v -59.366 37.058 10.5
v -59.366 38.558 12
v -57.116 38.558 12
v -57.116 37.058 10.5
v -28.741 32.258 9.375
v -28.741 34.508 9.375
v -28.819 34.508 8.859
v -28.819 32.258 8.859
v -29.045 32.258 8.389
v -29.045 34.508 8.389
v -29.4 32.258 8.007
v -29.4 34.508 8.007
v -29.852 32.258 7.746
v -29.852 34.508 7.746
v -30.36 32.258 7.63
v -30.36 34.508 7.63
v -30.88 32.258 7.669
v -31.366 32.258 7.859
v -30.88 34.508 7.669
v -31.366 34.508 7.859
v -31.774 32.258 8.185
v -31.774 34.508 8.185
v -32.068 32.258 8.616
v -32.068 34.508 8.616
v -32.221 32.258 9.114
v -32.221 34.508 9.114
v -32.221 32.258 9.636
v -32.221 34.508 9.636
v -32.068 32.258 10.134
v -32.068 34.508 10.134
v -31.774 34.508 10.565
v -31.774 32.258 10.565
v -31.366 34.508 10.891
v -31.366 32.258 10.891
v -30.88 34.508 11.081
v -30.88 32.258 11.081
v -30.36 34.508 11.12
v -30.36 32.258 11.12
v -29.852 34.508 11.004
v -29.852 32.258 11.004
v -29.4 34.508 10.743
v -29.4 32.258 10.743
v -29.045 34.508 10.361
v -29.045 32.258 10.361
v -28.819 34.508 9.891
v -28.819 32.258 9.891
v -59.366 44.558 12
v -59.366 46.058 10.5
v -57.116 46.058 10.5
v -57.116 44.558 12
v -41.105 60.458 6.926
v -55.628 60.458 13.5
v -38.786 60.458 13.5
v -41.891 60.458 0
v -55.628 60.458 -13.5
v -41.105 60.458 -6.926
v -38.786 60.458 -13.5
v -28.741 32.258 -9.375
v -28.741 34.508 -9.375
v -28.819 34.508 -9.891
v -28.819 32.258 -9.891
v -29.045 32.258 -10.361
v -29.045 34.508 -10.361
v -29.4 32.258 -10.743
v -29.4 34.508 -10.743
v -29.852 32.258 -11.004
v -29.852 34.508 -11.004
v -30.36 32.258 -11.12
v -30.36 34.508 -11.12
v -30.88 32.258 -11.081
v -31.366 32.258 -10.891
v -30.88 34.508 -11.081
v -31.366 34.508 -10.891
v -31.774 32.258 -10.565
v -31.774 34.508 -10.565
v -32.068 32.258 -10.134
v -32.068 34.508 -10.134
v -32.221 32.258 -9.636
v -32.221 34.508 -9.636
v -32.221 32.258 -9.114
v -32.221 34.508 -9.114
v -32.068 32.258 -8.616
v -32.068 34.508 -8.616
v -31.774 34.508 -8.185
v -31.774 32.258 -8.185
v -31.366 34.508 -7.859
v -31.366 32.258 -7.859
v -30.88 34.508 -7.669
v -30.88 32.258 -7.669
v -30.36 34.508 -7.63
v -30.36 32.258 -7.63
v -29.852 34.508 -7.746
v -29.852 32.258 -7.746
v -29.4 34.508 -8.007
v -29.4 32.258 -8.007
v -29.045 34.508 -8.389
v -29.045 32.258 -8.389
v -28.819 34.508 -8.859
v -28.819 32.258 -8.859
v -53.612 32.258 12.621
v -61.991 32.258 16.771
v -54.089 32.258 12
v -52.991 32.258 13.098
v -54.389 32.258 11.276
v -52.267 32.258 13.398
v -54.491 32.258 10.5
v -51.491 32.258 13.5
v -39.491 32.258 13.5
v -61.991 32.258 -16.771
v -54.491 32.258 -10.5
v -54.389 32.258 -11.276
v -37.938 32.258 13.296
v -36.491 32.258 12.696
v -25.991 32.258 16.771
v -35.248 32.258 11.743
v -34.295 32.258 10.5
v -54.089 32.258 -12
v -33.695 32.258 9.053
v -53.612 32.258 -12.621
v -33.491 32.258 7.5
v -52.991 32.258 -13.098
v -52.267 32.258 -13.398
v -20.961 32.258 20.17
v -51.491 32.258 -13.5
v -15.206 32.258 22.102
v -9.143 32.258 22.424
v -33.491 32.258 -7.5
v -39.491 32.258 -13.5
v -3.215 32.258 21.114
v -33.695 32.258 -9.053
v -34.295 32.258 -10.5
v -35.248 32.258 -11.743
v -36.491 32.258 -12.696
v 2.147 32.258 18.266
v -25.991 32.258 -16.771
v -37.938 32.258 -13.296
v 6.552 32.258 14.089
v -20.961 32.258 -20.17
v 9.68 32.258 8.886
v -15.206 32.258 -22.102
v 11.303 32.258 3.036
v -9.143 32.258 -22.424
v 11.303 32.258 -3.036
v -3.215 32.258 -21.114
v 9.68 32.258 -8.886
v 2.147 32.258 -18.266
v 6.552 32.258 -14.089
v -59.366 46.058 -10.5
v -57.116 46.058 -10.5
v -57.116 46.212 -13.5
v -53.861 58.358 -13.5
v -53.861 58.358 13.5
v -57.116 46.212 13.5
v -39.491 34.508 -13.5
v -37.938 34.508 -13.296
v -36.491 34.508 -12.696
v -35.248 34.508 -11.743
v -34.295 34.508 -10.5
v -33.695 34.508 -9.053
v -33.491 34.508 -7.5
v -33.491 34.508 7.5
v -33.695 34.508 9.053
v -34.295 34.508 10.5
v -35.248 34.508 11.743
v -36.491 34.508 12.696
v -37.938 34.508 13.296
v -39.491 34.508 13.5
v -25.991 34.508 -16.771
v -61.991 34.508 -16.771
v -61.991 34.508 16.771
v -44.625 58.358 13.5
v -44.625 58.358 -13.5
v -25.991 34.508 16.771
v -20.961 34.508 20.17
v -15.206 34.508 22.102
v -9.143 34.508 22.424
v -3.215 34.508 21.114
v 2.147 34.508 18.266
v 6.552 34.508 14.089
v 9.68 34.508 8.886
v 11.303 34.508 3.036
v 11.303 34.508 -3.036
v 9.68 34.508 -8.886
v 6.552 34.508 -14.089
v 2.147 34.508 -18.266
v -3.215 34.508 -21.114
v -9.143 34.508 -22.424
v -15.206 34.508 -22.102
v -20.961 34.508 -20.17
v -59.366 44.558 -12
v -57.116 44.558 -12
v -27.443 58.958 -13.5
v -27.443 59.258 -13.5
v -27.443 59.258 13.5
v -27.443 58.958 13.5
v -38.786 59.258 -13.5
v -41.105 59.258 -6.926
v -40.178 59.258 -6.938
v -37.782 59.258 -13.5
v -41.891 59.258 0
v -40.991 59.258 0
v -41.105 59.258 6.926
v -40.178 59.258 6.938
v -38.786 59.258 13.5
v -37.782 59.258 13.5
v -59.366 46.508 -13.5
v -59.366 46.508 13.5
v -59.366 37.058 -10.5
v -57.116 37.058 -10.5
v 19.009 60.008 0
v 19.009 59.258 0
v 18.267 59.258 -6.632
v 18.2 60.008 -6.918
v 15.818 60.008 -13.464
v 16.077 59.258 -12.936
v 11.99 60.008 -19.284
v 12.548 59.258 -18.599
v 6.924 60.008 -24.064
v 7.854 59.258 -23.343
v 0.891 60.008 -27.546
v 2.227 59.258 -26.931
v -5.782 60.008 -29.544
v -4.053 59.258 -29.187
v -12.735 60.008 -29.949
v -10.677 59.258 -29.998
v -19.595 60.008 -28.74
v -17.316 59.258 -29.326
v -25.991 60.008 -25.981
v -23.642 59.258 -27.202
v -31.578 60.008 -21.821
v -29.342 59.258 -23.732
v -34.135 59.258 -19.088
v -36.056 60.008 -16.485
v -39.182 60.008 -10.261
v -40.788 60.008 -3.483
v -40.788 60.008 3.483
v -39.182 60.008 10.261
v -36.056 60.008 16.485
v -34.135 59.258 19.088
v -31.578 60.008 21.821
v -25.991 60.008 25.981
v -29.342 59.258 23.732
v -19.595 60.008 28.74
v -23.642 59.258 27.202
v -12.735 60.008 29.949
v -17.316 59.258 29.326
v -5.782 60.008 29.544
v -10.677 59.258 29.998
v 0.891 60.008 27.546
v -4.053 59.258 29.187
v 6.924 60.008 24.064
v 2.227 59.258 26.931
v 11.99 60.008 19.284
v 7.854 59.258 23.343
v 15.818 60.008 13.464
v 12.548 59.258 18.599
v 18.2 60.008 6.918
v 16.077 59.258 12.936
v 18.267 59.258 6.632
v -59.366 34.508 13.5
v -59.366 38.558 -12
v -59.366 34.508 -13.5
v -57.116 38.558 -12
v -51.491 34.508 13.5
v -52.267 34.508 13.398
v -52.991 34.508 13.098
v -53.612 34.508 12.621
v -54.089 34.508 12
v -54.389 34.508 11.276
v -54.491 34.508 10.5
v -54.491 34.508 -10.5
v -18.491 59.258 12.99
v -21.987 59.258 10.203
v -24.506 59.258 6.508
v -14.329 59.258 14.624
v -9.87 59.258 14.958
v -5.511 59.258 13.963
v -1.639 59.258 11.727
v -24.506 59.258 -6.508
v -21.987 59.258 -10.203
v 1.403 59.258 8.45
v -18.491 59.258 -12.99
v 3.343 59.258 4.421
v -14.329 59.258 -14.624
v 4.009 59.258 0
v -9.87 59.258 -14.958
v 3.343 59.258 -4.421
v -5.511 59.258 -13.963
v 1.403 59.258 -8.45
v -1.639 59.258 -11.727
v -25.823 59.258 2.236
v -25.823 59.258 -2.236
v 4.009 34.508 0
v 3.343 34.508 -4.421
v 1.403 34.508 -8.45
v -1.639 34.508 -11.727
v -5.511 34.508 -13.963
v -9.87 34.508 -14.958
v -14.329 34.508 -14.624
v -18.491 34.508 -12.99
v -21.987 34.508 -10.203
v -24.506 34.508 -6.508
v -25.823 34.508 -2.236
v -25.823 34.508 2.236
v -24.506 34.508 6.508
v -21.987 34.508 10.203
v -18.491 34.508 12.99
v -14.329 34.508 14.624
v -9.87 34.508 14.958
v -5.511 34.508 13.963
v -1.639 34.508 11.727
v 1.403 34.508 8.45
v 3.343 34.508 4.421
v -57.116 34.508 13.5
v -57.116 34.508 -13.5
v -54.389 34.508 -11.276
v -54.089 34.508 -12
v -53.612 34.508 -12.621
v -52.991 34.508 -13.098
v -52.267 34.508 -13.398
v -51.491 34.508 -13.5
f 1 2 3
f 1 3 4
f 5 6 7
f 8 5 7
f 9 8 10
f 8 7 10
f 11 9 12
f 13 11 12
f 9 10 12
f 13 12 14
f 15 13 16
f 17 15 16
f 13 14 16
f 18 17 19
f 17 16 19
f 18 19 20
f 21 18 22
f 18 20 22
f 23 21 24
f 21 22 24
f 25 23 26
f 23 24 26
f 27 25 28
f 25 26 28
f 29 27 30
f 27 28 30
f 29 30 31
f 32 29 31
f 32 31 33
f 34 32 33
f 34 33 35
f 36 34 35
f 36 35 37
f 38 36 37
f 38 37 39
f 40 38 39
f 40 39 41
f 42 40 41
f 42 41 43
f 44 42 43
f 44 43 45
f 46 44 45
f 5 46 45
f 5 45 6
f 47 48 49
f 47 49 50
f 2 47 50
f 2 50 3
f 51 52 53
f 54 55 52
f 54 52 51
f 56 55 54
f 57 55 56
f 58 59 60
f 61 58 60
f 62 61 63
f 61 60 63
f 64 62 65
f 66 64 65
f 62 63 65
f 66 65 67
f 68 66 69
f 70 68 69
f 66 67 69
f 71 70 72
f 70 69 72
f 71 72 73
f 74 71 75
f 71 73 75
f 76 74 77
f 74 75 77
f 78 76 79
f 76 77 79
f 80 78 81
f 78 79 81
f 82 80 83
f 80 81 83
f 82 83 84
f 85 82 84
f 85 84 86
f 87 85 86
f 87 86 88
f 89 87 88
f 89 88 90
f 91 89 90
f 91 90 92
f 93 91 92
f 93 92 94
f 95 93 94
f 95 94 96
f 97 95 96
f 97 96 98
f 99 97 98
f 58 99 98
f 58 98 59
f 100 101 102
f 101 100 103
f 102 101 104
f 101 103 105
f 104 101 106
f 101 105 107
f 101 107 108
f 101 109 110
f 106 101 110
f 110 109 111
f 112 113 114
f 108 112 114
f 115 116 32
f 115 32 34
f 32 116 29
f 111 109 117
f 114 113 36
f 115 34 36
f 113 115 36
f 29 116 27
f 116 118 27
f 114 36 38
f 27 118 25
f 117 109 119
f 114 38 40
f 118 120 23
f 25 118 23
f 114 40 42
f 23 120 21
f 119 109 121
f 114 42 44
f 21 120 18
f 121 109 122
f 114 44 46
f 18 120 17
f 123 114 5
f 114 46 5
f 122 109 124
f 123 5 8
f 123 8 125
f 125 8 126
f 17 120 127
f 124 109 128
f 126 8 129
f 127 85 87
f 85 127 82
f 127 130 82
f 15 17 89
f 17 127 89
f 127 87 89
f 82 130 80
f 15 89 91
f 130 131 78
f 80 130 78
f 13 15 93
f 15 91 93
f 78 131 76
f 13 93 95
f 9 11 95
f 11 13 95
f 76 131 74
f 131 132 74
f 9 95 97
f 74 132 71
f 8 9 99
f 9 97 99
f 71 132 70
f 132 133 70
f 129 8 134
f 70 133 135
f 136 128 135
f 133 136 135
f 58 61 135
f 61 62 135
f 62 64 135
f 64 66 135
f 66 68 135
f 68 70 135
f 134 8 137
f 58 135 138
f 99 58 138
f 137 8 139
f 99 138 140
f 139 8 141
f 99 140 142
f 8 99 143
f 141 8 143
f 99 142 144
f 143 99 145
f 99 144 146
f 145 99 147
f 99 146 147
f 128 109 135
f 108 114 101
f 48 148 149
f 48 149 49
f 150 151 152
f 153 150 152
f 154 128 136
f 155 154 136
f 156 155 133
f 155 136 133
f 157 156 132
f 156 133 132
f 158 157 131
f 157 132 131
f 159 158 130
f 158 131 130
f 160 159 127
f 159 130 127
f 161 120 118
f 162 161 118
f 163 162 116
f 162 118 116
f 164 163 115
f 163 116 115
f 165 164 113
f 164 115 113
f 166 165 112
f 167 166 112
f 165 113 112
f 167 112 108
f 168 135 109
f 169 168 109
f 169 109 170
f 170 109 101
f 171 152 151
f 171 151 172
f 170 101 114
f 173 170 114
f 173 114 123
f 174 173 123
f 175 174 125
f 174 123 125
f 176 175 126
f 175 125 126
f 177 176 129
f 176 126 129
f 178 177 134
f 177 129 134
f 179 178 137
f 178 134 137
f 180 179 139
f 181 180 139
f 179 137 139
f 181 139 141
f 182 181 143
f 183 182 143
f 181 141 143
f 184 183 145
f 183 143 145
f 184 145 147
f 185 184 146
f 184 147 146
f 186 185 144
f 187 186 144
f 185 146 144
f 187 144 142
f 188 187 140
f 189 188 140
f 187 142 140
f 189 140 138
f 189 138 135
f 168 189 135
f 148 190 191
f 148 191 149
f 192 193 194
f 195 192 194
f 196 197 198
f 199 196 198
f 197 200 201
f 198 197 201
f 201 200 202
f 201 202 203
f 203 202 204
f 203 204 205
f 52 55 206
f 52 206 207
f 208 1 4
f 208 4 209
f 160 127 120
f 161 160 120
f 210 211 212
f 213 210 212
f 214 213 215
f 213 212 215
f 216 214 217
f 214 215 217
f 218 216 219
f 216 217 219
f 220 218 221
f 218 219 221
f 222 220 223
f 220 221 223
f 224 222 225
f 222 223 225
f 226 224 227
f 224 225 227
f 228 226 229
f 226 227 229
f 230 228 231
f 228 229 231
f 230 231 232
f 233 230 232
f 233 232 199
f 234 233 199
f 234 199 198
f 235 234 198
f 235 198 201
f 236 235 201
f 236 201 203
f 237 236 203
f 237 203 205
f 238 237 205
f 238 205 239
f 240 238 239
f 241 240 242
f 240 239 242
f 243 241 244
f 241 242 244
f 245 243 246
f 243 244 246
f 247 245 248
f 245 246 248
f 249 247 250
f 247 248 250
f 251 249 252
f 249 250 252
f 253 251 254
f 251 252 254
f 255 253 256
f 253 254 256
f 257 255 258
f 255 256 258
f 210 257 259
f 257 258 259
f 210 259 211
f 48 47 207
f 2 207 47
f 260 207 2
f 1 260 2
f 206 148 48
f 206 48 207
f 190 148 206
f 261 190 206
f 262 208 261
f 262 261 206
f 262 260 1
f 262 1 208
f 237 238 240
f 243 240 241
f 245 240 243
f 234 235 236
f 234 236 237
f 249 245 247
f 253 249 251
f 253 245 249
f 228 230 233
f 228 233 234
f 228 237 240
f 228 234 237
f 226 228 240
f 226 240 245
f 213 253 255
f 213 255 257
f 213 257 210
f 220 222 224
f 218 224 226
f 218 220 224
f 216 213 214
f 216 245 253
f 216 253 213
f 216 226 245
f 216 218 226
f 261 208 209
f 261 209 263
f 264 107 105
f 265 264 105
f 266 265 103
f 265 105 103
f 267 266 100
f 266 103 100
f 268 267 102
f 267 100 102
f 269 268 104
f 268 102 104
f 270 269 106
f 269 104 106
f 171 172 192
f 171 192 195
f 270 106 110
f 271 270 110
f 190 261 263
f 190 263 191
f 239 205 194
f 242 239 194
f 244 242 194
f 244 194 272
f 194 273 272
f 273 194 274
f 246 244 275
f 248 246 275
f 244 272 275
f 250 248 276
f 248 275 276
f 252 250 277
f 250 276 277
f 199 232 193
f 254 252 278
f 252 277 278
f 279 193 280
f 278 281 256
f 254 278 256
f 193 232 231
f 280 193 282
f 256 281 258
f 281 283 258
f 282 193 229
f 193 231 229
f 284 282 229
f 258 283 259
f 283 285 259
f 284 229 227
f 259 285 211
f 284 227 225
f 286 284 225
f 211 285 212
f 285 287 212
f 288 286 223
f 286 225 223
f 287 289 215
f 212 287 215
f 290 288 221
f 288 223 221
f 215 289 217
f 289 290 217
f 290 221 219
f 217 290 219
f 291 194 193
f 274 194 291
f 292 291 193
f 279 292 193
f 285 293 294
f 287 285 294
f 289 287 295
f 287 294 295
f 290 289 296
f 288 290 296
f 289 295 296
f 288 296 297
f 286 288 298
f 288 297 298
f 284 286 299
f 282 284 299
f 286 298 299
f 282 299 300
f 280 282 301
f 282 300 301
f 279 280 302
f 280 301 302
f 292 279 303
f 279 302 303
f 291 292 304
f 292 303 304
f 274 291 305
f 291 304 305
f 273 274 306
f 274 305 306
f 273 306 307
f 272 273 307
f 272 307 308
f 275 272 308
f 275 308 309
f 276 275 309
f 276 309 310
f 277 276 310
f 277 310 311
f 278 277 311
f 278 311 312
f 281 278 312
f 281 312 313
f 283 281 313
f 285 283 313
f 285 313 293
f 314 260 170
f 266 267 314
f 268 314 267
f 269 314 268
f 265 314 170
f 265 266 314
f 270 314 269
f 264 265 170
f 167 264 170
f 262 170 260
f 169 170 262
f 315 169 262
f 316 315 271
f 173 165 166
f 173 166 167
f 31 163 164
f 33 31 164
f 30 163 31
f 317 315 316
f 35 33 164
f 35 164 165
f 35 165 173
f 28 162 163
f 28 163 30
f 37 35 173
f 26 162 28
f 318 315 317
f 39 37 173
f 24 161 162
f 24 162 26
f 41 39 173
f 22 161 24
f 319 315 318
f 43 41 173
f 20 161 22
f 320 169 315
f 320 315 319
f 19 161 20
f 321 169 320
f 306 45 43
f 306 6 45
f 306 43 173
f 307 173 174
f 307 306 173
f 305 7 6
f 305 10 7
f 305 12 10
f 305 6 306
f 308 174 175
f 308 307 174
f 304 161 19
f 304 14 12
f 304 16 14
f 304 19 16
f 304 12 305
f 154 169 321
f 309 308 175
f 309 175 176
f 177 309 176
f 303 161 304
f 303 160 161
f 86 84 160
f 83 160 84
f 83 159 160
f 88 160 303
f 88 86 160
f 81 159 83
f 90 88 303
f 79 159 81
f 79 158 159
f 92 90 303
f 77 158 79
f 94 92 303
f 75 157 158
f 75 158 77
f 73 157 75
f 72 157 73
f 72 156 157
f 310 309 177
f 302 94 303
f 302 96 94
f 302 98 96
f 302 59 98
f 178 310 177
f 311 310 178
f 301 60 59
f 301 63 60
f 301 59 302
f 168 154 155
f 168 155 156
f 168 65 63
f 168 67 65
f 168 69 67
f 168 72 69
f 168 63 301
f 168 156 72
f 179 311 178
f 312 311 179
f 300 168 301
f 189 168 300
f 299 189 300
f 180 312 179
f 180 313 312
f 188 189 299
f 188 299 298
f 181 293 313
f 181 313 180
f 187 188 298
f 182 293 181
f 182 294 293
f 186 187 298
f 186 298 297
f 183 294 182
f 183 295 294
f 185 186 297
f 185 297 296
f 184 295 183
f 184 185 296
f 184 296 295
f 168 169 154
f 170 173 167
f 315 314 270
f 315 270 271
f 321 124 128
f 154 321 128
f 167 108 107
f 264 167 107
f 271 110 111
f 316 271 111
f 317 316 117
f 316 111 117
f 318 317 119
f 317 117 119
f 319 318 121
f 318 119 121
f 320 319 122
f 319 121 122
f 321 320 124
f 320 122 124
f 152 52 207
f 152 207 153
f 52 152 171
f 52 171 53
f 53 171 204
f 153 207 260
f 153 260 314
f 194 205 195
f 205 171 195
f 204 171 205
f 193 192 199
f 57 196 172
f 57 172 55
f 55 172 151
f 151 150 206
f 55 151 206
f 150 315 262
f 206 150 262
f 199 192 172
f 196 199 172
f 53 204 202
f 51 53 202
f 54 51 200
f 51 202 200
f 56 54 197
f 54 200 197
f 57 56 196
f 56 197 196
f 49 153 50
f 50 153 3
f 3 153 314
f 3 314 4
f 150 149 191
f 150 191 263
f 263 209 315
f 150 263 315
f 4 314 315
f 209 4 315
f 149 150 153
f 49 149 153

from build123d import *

# Parameters (mm, degrees)
SKETCH1_R               = 50
BOSS_EXTRUDE1_DEPTH     = 7.5
SKETCH1_2_R             = 50
BOSS_EXTRUDE2_DEPTH     = 90
SKETCH2_W               = 7.5
SKETCH2_H               = 90
BOSS_EXTRUDE3_DEPTH     = 40
SKETCH4_R               = 100
BOSS_EXTRUDE4_DEPTH     = 2.5
SKETCH7_W               = 90
SKETCH7_H               = 50
BOSS_EXTRUDE9_DEPTH     = 7.5
CUT_EXTRUDE1_REACH      = 297.683
SKETCH14_W              = 95
SKETCH14_H              = 90
BOSS_EXTRUDE13_DEPTH    = 3
BOSS_EXTRUDE14_DEPTH    = 5
CUT_EXTRUDE3_DEPTH      = 5
CUT_EXTRUDE3_DEPTH_BACK = 1
SKETCH17_W              = 70.898930346
SKETCH17_H              = 90
CHAMFER3_SIZE           = 2
CHAMFER3_SIZE2          = 57.272506566
SCALE1_SCALE            = 0.3
CUT_EXTRUDE4_REACH      = 75.595
SKETCH19_R              = 1.75


with BuildPart() as part:
    # Sketch1 → Boss-Extrude1 (new body)
    with BuildSketch(Plane(origin=(0, 0, 0), x_dir=(1, 0, 0), z_dir=(0, 1, 0))):
        with BuildLine():
            Line((-50, 55.901699437), (-170, 55.901699437))
            Line((-170, 55.901699437), (-170, -55.901699437))
            Line((-170, -55.901699437), (-50, -55.901699437))
            ThreePointArc((-50, -55.901699437), (75, 0), (-50, 55.901699437))
        make_face()
        Circle(SKETCH1_R, mode=Mode.SUBTRACT)
        with BuildLine():
            Line((-95, -45), (-135, -45))
            ThreePointArc((-135, -45), (-142.071067812, -42.071067812), (-145, -35))
            Line((-145, -35), (-145, 35))
            ThreePointArc((-145, 35), (-142.071067812, 42.071067812), (-135, 45))
            Line((-135, 45), (-95, 45))
            ThreePointArc((-95, 45), (-80.857864376, 39.142135624), (-75, 25))
            Line((-75, 25), (-75, -25))
            ThreePointArc((-75, -25), (-80.857864376, -39.142135624), (-95, -45))
        make_face(mode=Mode.SUBTRACT)
    extrude(amount=BOSS_EXTRUDE1_DEPTH)

    # Sketch1<2> → Boss-Extrude2 (add)
    with BuildSketch(Plane(origin=(0, 0, 0), x_dir=(1, 0, 0), z_dir=(0, 1, 0))):
        Circle(SKETCH1_2_R)
    extrude(amount=BOSS_EXTRUDE2_DEPTH)

    # Sketch2 → Boss-Extrude3 (add)
    with BuildSketch(Plane(origin=(0, 7.5, 0), x_dir=(1, 0, 0), z_dir=(0, 1, 0))):
        with Locations((-157.5, 0)):
            Rectangle(SKETCH2_W, SKETCH2_H)
    extrude(amount=BOSS_EXTRUDE3_DEPTH)

    # Sketch4 → Boss-Extrude4 (add)
    with BuildSketch(Plane(origin=(0, 90, 0), x_dir=(1, 0, 0), z_dir=(0, 1, 0))):
        Circle(SKETCH4_R)
    extrude(amount=BOSS_EXTRUDE4_DEPTH)

    # Sketch7 → Boss-Extrude9 (add)
    with BuildSketch(Plane(origin=(-162.32329818, 43.49439666, 0), x_dir=(0, 0, 1), z_dir=(-0.9659258262890691, 0.2588190451025179, 0))):
        with Locations((0, 29.146905726)):
            Rectangle(SKETCH7_W, SKETCH7_H)
    extrude(amount=-BOSS_EXTRUDE9_DEPTH)

    # Sketch3 → Cut-Extrude1 (cut, up to next)
    with BuildSketch(Plane.ZY.offset(161.25), mode=Mode.PRIVATE) as cut_extrude1_sk1:
        Polygon((35, 46), (40, 41), (40, 21), (35, 16), (-35, 16), (-40, 21), (-40, 41), (-35, 46), align=None)
    cut_extrude1_tool1 = extrude(cut_extrude1_sk1.sketch, amount=-CUT_EXTRUDE1_REACH, mode=Mode.PRIVATE) & part.part
    add(cut_extrude1_tool1.solids().sort_by_distance((-161.25, 31, 0))[0], mode=Mode.SUBTRACT)

    # Sketch14 → Boss-Extrude13 (add)
    with BuildSketch(Plane.XZ.offset(-90)):
        with Locations((-102.34127557, 0)):
            Rectangle(SKETCH14_W, SKETCH14_H)
    extrude(amount=BOSS_EXTRUDE13_DEPTH)

    # Sketch15 → Boss-Extrude14 (add)
    with BuildSketch(Plane(origin=(0, 90, 0), x_dir=(1, 0, 0), z_dir=(0, 1, 0))):
        with BuildLine():
            Line((-92.649878575, 45), (-144.686825896, 45))
            Line((-144.686825896, 45), (-144.686825896, -45))
            Line((-144.686825896, -45), (-92.649878575, -45))
            ThreePointArc((-92.649878575, -45), (-103, 0), (-92.649878575, 45))
        make_face()
    extrude(amount=BOSS_EXTRUDE14_DEPTH)

    # Sketch17 → Cut-Extrude3 (cut, two sides: drawn at the far end of the back side and taken through both)
    with BuildSketch(Plane(origin=(0, 95, 0), x_dir=(1, 0, 0), z_dir=(0, 1, 0)).offset(-CUT_EXTRUDE3_DEPTH_BACK)):
        with Locations((-122.050534827, 0)):
            Rectangle(SKETCH17_W, SKETCH17_H)
    extrude(amount=CUT_EXTRUDE3_DEPTH + CUT_EXTRUDE3_DEPTH_BACK, mode=Mode.SUBTRACT)

    # Chamfer3
    chamfer3_edges = [part.edges().sort_by_distance(p)[0] for p in [
        (-54.84127557, 87, 0),
    ]]
    chamfer3_side = [part.faces().sort_by_distance(p)[0] for p in [
        (-54.84127557, 88.5, 0),
    ]]
    chamfer(chamfer3_edges, length=CHAMFER3_SIZE, length2=CHAMFER3_SIZE2, reference=chamfer3_side[0])


with BuildPart() as part_1:
    # Scale1: scaled about (-15.701446572, 46.083241644, 0)
    add(part.part.scale(SCALE1_SCALE).moved(Location((-10.9910126, 32.258269151, 0))))

    # Sketch19 → Cut-Extrude4 (cut, up to next)
    with BuildSketch(Plane(origin=(0, 34.50826915, 0), x_dir=(1, 0, 0), z_dir=(0, 1, 0)), mode=Mode.PRIVATE) as cut_extrude4_sk1:
        with Locations((-30.491012601, 9.375)):
            Circle(SKETCH19_R)
    cut_extrude4_tool1 = extrude(cut_extrude4_sk1.sketch, amount=-CUT_EXTRUDE4_REACH, mode=Mode.PRIVATE) & part_1.part
    # Sketch19 → Cut-Extrude4 (cut, up to next)
    with BuildSketch(Plane(origin=(0, 34.50826915, 0), x_dir=(1, 0, 0), z_dir=(0, 1, 0)), mode=Mode.PRIVATE) as cut_extrude4_sk2:
        with Locations((-30.491012601, -9.375)):
            Circle(SKETCH19_R)
    cut_extrude4_tool2 = extrude(cut_extrude4_sk2.sketch, amount=-CUT_EXTRUDE4_REACH, mode=Mode.PRIVATE) & part_1.part
    add(cut_extrude4_tool1.solids().sort_by_distance((-30.491013, 34.508269, -9.375))[0], mode=Mode.SUBTRACT)
    add(cut_extrude4_tool2.solids().sort_by_distance((-30.491013, 34.508269, 9.375))[0], mode=Mode.SUBTRACT)


solid = part_1.part
